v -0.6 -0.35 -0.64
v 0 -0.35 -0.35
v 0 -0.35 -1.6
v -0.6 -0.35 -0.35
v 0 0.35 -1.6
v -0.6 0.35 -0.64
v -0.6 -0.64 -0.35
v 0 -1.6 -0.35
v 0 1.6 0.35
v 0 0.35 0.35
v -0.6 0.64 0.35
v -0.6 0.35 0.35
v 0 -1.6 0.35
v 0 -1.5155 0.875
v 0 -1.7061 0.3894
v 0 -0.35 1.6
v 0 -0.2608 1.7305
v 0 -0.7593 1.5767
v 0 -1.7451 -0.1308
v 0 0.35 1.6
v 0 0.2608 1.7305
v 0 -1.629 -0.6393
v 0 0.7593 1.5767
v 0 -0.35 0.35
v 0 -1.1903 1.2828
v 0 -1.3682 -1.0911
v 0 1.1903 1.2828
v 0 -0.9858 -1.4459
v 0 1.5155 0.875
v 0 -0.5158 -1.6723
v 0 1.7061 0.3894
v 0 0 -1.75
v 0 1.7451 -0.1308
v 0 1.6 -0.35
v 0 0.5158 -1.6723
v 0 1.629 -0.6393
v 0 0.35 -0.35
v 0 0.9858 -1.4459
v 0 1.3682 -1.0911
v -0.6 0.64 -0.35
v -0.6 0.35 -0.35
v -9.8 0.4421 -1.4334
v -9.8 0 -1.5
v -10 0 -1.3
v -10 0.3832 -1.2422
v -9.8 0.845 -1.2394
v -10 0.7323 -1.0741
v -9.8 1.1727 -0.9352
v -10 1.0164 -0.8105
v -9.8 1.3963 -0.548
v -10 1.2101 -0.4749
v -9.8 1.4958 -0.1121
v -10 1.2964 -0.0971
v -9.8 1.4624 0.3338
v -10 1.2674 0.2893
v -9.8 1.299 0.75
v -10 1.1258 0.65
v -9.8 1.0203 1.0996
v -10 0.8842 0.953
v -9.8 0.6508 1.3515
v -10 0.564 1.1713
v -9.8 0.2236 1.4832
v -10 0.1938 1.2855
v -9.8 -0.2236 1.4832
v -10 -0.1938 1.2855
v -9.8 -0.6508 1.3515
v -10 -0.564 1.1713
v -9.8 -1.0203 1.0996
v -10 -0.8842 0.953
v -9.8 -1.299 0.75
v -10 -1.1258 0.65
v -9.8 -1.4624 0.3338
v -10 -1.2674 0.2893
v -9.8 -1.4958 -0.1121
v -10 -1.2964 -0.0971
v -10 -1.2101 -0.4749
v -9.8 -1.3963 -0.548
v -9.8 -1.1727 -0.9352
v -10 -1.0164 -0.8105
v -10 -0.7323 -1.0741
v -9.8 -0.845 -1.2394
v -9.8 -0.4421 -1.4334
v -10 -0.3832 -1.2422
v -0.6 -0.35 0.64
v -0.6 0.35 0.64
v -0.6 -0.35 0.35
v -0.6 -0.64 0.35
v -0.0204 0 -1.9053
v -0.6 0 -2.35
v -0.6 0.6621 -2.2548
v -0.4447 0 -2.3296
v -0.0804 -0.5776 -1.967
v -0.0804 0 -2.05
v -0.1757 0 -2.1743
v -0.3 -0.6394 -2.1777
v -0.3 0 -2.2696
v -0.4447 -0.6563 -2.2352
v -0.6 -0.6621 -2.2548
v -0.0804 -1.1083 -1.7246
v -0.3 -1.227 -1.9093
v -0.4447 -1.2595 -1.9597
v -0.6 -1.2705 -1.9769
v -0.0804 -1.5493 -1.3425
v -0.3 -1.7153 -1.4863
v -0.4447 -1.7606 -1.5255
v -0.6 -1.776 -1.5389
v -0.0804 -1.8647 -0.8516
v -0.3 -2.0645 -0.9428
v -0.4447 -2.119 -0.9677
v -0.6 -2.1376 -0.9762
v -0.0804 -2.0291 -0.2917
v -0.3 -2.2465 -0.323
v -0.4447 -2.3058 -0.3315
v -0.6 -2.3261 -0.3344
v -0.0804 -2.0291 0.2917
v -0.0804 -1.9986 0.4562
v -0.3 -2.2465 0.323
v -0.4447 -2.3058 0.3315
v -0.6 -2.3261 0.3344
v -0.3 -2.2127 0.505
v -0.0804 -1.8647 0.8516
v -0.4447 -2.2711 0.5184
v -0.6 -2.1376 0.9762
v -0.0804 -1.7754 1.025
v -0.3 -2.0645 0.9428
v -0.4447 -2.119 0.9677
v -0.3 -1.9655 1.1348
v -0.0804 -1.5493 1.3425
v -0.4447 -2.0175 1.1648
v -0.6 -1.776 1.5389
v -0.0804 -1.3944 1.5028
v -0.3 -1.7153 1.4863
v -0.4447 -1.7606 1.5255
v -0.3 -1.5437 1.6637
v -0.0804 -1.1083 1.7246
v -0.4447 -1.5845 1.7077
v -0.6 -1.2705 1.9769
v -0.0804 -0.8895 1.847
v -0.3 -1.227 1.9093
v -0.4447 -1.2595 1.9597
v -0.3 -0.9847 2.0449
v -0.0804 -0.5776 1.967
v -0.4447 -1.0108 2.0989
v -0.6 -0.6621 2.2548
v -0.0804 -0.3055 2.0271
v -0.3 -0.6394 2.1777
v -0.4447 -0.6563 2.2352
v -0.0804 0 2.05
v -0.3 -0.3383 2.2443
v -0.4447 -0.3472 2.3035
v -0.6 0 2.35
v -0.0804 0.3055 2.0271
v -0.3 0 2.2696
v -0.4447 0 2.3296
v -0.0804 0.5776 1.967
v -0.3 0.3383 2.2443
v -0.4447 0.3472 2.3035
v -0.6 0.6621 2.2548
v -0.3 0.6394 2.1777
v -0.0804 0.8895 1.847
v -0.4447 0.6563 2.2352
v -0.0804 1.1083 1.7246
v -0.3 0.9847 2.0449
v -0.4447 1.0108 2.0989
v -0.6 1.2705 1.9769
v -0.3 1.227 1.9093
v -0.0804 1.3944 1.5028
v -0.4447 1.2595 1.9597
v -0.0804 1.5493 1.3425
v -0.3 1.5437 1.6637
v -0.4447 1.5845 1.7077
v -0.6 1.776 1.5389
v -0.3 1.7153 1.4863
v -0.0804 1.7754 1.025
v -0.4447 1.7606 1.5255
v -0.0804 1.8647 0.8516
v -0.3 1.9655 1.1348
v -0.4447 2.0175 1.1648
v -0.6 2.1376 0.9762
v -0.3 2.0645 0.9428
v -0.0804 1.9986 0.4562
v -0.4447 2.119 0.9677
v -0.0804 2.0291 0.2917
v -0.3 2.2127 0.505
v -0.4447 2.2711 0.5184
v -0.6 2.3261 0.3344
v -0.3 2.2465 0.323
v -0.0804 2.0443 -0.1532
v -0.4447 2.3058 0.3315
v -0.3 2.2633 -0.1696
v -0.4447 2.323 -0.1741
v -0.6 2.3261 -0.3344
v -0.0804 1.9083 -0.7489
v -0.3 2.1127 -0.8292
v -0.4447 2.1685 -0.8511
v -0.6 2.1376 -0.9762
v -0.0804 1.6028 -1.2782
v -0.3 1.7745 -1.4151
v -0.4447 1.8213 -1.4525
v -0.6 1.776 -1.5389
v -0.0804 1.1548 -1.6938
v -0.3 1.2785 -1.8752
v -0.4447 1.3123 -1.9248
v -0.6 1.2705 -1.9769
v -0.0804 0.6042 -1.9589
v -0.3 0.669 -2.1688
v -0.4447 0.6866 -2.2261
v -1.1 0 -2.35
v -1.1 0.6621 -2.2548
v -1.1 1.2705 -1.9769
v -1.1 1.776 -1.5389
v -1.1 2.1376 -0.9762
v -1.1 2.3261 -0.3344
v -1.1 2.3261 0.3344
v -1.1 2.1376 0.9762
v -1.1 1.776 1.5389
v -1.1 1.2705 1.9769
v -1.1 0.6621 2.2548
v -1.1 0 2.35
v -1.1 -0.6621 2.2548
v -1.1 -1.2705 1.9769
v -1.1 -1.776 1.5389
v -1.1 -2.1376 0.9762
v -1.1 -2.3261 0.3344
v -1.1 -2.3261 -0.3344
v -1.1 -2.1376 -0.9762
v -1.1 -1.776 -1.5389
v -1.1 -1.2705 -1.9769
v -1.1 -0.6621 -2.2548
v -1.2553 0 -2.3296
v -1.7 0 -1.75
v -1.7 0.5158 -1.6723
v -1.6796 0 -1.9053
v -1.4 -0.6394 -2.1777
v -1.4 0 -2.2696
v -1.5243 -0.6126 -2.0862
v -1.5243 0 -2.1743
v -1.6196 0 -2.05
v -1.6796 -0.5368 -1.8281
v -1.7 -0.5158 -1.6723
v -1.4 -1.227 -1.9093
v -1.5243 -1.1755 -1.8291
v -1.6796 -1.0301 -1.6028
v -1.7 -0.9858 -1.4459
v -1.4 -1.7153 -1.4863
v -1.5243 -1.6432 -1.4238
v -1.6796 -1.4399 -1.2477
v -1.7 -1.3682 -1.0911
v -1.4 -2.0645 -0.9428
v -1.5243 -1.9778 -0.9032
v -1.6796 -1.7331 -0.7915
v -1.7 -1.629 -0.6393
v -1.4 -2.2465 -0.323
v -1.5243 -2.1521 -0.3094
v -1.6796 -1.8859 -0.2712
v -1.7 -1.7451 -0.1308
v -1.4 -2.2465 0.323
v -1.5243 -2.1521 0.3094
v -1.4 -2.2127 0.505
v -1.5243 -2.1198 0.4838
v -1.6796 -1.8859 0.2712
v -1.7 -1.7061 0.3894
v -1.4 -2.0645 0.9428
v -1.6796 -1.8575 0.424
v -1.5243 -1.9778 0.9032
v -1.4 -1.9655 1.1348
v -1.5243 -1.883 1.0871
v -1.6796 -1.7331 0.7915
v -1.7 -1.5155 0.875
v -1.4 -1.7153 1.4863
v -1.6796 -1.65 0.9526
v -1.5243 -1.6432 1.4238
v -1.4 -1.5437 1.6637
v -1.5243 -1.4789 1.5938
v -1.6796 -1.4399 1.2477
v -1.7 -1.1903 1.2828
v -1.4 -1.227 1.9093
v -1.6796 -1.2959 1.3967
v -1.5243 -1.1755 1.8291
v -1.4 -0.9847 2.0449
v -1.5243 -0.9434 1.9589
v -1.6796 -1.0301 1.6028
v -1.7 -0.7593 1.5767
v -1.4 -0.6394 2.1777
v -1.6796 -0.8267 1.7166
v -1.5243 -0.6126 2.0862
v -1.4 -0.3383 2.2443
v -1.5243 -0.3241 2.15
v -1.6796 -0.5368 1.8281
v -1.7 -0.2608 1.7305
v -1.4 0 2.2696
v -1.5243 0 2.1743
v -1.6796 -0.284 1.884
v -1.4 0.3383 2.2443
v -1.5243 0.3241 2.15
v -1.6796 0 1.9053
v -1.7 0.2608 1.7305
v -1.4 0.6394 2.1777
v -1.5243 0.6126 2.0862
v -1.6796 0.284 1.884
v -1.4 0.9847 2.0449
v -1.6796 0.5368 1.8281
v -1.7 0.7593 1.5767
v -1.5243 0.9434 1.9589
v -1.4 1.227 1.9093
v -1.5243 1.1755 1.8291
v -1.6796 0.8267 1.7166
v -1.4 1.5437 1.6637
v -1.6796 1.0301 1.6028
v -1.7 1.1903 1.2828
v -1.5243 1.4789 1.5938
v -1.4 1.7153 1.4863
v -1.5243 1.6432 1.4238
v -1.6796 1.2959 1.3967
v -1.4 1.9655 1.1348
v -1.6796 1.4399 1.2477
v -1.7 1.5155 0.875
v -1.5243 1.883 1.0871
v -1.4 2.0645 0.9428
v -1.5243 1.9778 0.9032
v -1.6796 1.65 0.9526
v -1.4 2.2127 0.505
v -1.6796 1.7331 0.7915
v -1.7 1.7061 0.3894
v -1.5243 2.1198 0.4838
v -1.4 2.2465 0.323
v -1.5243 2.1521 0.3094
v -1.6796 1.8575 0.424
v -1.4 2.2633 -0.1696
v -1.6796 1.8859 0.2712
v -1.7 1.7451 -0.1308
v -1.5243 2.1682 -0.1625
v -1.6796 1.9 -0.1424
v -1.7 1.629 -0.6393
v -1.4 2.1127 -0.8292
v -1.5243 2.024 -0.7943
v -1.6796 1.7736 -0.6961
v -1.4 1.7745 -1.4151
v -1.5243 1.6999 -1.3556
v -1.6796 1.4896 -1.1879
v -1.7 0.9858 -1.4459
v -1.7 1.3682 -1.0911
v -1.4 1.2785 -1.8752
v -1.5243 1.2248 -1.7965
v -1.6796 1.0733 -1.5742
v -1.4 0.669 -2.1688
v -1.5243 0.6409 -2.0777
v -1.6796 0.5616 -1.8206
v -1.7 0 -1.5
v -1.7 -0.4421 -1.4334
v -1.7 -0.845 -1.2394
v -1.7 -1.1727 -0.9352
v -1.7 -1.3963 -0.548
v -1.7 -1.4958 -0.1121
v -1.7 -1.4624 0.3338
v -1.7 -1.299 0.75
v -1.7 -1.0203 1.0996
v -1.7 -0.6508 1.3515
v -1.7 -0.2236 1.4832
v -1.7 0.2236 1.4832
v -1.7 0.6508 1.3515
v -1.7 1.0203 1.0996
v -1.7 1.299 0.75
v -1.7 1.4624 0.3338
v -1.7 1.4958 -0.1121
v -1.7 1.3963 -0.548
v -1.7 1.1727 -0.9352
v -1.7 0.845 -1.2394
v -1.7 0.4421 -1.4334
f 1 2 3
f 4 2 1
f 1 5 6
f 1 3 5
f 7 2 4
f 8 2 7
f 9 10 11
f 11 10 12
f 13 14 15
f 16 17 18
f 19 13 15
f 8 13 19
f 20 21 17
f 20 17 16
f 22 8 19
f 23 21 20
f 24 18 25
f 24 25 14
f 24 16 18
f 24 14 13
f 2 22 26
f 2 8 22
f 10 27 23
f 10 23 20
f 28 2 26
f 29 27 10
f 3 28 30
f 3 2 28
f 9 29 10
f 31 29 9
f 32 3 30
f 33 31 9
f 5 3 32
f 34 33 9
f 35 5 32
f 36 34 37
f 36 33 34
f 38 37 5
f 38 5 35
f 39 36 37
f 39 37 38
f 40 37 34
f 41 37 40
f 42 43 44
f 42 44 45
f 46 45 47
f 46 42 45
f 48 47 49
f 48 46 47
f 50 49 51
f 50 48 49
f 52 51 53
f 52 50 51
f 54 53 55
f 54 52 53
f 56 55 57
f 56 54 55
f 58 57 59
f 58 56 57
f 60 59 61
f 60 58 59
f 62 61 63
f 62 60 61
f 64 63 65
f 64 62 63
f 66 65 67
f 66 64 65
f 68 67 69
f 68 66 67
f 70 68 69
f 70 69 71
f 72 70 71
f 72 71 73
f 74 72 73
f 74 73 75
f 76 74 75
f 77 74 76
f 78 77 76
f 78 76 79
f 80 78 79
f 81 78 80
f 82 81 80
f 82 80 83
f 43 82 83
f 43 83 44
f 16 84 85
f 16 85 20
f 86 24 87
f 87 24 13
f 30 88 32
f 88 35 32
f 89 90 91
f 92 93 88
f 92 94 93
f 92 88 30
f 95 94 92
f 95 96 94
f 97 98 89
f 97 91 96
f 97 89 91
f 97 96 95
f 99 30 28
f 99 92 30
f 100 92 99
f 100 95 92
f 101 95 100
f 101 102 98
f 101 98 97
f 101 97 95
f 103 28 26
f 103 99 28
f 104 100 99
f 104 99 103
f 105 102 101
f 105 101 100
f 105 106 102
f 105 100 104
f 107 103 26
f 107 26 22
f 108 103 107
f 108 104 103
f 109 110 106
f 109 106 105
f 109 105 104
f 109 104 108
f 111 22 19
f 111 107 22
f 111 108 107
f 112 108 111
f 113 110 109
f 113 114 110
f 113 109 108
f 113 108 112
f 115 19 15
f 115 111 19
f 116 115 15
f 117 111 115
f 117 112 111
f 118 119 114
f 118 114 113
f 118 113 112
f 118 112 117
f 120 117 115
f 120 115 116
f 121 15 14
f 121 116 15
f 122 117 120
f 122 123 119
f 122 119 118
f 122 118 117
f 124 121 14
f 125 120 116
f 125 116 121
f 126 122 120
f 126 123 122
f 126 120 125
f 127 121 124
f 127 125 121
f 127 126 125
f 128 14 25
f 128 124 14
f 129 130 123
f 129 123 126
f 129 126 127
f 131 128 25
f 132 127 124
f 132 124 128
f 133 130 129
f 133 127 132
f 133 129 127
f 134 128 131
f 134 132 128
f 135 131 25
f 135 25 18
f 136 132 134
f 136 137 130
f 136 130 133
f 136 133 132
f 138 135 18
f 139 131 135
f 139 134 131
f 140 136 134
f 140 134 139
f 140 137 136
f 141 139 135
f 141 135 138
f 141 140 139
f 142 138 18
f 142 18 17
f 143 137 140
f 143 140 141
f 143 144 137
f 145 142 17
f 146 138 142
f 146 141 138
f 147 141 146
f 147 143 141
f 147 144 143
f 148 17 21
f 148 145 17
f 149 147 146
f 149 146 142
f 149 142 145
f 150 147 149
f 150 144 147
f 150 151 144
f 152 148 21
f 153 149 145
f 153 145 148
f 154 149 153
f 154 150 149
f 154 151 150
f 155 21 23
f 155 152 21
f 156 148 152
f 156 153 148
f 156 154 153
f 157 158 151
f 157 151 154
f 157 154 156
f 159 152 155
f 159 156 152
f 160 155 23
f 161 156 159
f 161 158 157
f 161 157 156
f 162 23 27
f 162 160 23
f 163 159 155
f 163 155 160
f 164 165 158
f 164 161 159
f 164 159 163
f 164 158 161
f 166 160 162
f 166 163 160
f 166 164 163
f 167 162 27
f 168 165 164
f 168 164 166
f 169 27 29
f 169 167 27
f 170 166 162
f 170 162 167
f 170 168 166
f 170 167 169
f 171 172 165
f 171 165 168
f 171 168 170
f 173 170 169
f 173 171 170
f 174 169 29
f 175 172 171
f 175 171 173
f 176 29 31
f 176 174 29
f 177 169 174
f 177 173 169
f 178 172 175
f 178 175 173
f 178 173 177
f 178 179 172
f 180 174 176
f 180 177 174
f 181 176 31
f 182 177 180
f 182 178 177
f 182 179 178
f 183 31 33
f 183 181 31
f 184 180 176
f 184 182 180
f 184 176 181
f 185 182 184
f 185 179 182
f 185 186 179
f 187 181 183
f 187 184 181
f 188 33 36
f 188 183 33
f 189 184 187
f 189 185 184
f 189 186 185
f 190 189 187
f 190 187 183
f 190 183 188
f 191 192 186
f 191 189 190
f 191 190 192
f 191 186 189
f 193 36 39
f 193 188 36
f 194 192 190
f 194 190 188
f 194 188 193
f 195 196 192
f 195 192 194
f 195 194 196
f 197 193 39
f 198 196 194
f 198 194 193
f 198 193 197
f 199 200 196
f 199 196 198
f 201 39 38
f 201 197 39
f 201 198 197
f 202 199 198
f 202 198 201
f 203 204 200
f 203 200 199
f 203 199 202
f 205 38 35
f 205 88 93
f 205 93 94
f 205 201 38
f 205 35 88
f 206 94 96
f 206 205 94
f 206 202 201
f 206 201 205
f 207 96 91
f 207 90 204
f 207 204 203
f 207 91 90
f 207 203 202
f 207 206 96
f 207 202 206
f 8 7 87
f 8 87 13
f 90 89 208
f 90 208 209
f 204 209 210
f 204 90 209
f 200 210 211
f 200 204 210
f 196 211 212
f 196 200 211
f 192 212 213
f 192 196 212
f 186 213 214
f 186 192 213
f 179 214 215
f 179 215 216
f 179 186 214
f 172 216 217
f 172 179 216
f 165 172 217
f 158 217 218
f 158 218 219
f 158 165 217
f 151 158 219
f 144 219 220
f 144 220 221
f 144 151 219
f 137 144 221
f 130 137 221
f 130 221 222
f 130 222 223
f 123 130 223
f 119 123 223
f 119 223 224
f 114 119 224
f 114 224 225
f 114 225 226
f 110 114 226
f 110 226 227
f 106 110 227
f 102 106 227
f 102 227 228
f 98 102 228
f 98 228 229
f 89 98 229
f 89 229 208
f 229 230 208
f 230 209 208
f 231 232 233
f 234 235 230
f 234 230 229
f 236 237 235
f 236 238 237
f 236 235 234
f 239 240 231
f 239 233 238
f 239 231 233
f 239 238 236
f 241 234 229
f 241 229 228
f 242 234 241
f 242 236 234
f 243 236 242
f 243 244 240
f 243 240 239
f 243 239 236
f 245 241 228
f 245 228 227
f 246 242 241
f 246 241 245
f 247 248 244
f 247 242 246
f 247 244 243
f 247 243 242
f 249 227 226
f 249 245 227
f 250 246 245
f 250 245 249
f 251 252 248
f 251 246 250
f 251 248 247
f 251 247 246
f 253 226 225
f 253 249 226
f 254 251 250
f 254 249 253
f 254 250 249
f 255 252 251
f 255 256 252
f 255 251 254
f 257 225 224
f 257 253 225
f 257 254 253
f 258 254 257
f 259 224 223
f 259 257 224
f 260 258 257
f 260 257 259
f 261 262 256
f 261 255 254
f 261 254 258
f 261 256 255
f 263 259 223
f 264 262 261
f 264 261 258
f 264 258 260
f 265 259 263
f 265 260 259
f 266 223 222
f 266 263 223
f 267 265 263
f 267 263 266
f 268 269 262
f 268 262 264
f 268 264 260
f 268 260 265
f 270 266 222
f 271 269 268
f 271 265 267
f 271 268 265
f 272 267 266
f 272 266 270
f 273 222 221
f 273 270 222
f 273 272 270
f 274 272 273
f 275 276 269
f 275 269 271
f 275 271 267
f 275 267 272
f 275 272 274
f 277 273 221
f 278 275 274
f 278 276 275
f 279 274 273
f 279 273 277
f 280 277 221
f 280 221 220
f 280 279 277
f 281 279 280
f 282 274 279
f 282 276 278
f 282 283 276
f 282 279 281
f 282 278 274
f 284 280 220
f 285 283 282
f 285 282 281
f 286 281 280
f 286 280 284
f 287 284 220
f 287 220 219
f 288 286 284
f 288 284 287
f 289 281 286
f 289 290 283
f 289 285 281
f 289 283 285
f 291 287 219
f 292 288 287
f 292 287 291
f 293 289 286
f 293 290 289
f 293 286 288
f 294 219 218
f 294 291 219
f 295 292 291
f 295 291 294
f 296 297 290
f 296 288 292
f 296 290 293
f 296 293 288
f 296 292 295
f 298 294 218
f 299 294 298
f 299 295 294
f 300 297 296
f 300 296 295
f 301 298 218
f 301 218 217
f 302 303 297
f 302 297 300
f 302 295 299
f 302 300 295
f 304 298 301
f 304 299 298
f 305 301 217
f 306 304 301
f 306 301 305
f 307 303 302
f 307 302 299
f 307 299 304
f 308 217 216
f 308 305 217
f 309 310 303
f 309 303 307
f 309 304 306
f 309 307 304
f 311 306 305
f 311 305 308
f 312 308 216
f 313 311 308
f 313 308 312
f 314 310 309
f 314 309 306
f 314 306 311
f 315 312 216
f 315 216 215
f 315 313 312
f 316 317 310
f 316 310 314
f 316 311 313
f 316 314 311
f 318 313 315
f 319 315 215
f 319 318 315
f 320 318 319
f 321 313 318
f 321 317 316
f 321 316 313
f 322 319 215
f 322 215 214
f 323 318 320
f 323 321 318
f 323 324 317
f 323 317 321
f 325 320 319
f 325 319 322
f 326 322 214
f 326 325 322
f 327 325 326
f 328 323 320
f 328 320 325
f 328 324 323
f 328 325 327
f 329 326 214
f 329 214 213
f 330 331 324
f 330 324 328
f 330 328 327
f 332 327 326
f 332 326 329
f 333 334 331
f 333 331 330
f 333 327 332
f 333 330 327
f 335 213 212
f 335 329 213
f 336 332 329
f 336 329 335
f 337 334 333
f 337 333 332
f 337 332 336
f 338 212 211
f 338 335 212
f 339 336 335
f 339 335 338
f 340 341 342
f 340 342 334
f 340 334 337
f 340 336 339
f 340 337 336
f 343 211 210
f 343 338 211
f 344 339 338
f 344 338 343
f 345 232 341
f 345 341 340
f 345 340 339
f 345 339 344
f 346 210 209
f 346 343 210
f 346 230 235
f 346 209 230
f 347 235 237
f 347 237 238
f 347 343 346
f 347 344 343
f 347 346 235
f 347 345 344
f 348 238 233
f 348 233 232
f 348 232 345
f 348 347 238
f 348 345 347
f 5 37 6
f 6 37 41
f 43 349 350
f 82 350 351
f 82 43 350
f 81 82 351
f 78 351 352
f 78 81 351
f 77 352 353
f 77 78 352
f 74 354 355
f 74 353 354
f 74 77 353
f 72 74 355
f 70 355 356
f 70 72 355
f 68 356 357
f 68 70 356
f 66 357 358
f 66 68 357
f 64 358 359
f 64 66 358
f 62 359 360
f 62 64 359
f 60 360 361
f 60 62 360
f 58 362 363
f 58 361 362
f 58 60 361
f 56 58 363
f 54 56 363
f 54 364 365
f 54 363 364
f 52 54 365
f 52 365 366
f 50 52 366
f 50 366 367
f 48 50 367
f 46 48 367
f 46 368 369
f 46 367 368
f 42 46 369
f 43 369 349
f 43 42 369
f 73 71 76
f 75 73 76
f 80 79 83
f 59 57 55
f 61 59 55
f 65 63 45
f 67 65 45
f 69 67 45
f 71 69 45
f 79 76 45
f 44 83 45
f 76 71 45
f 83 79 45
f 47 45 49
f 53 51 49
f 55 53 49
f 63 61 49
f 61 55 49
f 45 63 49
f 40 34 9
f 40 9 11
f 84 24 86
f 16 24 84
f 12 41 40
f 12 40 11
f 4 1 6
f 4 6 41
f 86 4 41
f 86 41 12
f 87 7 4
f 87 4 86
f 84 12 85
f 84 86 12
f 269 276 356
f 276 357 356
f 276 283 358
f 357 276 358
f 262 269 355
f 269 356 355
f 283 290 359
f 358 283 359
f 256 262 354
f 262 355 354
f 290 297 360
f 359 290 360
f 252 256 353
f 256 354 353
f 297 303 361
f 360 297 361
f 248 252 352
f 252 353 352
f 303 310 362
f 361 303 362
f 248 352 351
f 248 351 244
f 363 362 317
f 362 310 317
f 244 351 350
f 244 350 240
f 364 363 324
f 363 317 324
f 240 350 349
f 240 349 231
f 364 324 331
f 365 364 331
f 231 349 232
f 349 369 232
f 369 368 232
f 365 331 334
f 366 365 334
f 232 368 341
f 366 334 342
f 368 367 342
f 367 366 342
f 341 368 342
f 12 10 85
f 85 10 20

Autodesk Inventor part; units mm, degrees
ref_plane "YZ Plane" through (0, 0, 0) normal (1, 0, 0) x (0, 1, 0)
ref_plane "XZ Plane" through (0, 0, 0) normal (0, 1, 0) x (-1, 0, 0)
ref_plane "XY Plane" through (0, 0, 0) normal (0, 0, 1) x (1, 0, 0)
sketch "Sketch1" plane through (0, 0, 0) normal (0, 1, 0) x (-1, 0, 0)
  line L0 (0, 0) -> (1.7, 0)
  line L1 (1.7, 0) -> (1.7, -1.75)
  line L2 (1.1, -2.35) -> (0.6, -2.35)
  line L3 (0, -1.75) -> (0, 0)
  line L4 (1.7, -1.5) -> (10, -1.5)
  line L5 (10, -1.5) -> (10, 0)
  line L6 (10, 0) -> (1.7, 0)
  line L7 (1.7, 0) -> (1.7, -1.5)
  line L8 (1.7, 0) -> (1.7, 2.35)
  line L9 (1.7, 2.35) -> (0, 2.35)
  line L10 (0, 2.35) -> (0, 0)
  line L11 (1.7, 1.5) -> (10, 1.5)
  line L12 (10, 1.5) -> (10, 0)
  arc A0 (1.1, -2.35) -> (1.7, -1.75) centre (1.1, -1.75) ccw
  arc A1 (0, -1.75) -> (0.6, -2.35) centre (0.6, -1.75) ccw
  point P0 (1.7, -2.35)
  point P1 (0, -2.35)
  dimension "d1" = 3
  dimension "d2" = 4.7
  dimension "d3" = 1.7
  dimension "d4" = 10
  dimension "d6" = 0.6
  dimension "d7" = 0.6
revolve "Revolution1" add sketch "Sketch1" angle 360 about axis through (-10, 0, 0) along (1, 0, 0) contours L0 L1 A0 L2 A1 L3 | L6 L5 L4 L1
chamfer "Chamfer1" distance 0.2 angle 45 1 edges at (-10, 0, 1.5)
sketch "Sketch3" plane through (0, 0, 0) normal (0, 1, 0) x (-1, 0, 0)
  line L0 (0.6, 2.35) -> (0.6, -2.35) construction
  line L1 (0, 1.75) -> (0, -1.75) projected
  line L2 (0, -1.6) -> (1, 0)
  line L3 (1, 0) -> (0, 0)
  line L4 (1, 0) -> (0, 1.6)
  line L5 (0.6, -0.64) -> (0.6, 0.64)
  dimension "d11" = 3.2
  dimension "d12" = 1
  dimension "d18" = 0.6
extrude "Extrusion1" cut sketch "Sketch3" along normal mid plane 0.7 contours L4 L5 L3 L1 | L3 L5 L2 L1
pattern_circular "Circular Pattern1" count 2 over 90 about axis through (-0.85, 0, 0) along (1, 0, 0) of "Extrusion1"
equation "\"d6\" = d7"
properties part number "screw"
